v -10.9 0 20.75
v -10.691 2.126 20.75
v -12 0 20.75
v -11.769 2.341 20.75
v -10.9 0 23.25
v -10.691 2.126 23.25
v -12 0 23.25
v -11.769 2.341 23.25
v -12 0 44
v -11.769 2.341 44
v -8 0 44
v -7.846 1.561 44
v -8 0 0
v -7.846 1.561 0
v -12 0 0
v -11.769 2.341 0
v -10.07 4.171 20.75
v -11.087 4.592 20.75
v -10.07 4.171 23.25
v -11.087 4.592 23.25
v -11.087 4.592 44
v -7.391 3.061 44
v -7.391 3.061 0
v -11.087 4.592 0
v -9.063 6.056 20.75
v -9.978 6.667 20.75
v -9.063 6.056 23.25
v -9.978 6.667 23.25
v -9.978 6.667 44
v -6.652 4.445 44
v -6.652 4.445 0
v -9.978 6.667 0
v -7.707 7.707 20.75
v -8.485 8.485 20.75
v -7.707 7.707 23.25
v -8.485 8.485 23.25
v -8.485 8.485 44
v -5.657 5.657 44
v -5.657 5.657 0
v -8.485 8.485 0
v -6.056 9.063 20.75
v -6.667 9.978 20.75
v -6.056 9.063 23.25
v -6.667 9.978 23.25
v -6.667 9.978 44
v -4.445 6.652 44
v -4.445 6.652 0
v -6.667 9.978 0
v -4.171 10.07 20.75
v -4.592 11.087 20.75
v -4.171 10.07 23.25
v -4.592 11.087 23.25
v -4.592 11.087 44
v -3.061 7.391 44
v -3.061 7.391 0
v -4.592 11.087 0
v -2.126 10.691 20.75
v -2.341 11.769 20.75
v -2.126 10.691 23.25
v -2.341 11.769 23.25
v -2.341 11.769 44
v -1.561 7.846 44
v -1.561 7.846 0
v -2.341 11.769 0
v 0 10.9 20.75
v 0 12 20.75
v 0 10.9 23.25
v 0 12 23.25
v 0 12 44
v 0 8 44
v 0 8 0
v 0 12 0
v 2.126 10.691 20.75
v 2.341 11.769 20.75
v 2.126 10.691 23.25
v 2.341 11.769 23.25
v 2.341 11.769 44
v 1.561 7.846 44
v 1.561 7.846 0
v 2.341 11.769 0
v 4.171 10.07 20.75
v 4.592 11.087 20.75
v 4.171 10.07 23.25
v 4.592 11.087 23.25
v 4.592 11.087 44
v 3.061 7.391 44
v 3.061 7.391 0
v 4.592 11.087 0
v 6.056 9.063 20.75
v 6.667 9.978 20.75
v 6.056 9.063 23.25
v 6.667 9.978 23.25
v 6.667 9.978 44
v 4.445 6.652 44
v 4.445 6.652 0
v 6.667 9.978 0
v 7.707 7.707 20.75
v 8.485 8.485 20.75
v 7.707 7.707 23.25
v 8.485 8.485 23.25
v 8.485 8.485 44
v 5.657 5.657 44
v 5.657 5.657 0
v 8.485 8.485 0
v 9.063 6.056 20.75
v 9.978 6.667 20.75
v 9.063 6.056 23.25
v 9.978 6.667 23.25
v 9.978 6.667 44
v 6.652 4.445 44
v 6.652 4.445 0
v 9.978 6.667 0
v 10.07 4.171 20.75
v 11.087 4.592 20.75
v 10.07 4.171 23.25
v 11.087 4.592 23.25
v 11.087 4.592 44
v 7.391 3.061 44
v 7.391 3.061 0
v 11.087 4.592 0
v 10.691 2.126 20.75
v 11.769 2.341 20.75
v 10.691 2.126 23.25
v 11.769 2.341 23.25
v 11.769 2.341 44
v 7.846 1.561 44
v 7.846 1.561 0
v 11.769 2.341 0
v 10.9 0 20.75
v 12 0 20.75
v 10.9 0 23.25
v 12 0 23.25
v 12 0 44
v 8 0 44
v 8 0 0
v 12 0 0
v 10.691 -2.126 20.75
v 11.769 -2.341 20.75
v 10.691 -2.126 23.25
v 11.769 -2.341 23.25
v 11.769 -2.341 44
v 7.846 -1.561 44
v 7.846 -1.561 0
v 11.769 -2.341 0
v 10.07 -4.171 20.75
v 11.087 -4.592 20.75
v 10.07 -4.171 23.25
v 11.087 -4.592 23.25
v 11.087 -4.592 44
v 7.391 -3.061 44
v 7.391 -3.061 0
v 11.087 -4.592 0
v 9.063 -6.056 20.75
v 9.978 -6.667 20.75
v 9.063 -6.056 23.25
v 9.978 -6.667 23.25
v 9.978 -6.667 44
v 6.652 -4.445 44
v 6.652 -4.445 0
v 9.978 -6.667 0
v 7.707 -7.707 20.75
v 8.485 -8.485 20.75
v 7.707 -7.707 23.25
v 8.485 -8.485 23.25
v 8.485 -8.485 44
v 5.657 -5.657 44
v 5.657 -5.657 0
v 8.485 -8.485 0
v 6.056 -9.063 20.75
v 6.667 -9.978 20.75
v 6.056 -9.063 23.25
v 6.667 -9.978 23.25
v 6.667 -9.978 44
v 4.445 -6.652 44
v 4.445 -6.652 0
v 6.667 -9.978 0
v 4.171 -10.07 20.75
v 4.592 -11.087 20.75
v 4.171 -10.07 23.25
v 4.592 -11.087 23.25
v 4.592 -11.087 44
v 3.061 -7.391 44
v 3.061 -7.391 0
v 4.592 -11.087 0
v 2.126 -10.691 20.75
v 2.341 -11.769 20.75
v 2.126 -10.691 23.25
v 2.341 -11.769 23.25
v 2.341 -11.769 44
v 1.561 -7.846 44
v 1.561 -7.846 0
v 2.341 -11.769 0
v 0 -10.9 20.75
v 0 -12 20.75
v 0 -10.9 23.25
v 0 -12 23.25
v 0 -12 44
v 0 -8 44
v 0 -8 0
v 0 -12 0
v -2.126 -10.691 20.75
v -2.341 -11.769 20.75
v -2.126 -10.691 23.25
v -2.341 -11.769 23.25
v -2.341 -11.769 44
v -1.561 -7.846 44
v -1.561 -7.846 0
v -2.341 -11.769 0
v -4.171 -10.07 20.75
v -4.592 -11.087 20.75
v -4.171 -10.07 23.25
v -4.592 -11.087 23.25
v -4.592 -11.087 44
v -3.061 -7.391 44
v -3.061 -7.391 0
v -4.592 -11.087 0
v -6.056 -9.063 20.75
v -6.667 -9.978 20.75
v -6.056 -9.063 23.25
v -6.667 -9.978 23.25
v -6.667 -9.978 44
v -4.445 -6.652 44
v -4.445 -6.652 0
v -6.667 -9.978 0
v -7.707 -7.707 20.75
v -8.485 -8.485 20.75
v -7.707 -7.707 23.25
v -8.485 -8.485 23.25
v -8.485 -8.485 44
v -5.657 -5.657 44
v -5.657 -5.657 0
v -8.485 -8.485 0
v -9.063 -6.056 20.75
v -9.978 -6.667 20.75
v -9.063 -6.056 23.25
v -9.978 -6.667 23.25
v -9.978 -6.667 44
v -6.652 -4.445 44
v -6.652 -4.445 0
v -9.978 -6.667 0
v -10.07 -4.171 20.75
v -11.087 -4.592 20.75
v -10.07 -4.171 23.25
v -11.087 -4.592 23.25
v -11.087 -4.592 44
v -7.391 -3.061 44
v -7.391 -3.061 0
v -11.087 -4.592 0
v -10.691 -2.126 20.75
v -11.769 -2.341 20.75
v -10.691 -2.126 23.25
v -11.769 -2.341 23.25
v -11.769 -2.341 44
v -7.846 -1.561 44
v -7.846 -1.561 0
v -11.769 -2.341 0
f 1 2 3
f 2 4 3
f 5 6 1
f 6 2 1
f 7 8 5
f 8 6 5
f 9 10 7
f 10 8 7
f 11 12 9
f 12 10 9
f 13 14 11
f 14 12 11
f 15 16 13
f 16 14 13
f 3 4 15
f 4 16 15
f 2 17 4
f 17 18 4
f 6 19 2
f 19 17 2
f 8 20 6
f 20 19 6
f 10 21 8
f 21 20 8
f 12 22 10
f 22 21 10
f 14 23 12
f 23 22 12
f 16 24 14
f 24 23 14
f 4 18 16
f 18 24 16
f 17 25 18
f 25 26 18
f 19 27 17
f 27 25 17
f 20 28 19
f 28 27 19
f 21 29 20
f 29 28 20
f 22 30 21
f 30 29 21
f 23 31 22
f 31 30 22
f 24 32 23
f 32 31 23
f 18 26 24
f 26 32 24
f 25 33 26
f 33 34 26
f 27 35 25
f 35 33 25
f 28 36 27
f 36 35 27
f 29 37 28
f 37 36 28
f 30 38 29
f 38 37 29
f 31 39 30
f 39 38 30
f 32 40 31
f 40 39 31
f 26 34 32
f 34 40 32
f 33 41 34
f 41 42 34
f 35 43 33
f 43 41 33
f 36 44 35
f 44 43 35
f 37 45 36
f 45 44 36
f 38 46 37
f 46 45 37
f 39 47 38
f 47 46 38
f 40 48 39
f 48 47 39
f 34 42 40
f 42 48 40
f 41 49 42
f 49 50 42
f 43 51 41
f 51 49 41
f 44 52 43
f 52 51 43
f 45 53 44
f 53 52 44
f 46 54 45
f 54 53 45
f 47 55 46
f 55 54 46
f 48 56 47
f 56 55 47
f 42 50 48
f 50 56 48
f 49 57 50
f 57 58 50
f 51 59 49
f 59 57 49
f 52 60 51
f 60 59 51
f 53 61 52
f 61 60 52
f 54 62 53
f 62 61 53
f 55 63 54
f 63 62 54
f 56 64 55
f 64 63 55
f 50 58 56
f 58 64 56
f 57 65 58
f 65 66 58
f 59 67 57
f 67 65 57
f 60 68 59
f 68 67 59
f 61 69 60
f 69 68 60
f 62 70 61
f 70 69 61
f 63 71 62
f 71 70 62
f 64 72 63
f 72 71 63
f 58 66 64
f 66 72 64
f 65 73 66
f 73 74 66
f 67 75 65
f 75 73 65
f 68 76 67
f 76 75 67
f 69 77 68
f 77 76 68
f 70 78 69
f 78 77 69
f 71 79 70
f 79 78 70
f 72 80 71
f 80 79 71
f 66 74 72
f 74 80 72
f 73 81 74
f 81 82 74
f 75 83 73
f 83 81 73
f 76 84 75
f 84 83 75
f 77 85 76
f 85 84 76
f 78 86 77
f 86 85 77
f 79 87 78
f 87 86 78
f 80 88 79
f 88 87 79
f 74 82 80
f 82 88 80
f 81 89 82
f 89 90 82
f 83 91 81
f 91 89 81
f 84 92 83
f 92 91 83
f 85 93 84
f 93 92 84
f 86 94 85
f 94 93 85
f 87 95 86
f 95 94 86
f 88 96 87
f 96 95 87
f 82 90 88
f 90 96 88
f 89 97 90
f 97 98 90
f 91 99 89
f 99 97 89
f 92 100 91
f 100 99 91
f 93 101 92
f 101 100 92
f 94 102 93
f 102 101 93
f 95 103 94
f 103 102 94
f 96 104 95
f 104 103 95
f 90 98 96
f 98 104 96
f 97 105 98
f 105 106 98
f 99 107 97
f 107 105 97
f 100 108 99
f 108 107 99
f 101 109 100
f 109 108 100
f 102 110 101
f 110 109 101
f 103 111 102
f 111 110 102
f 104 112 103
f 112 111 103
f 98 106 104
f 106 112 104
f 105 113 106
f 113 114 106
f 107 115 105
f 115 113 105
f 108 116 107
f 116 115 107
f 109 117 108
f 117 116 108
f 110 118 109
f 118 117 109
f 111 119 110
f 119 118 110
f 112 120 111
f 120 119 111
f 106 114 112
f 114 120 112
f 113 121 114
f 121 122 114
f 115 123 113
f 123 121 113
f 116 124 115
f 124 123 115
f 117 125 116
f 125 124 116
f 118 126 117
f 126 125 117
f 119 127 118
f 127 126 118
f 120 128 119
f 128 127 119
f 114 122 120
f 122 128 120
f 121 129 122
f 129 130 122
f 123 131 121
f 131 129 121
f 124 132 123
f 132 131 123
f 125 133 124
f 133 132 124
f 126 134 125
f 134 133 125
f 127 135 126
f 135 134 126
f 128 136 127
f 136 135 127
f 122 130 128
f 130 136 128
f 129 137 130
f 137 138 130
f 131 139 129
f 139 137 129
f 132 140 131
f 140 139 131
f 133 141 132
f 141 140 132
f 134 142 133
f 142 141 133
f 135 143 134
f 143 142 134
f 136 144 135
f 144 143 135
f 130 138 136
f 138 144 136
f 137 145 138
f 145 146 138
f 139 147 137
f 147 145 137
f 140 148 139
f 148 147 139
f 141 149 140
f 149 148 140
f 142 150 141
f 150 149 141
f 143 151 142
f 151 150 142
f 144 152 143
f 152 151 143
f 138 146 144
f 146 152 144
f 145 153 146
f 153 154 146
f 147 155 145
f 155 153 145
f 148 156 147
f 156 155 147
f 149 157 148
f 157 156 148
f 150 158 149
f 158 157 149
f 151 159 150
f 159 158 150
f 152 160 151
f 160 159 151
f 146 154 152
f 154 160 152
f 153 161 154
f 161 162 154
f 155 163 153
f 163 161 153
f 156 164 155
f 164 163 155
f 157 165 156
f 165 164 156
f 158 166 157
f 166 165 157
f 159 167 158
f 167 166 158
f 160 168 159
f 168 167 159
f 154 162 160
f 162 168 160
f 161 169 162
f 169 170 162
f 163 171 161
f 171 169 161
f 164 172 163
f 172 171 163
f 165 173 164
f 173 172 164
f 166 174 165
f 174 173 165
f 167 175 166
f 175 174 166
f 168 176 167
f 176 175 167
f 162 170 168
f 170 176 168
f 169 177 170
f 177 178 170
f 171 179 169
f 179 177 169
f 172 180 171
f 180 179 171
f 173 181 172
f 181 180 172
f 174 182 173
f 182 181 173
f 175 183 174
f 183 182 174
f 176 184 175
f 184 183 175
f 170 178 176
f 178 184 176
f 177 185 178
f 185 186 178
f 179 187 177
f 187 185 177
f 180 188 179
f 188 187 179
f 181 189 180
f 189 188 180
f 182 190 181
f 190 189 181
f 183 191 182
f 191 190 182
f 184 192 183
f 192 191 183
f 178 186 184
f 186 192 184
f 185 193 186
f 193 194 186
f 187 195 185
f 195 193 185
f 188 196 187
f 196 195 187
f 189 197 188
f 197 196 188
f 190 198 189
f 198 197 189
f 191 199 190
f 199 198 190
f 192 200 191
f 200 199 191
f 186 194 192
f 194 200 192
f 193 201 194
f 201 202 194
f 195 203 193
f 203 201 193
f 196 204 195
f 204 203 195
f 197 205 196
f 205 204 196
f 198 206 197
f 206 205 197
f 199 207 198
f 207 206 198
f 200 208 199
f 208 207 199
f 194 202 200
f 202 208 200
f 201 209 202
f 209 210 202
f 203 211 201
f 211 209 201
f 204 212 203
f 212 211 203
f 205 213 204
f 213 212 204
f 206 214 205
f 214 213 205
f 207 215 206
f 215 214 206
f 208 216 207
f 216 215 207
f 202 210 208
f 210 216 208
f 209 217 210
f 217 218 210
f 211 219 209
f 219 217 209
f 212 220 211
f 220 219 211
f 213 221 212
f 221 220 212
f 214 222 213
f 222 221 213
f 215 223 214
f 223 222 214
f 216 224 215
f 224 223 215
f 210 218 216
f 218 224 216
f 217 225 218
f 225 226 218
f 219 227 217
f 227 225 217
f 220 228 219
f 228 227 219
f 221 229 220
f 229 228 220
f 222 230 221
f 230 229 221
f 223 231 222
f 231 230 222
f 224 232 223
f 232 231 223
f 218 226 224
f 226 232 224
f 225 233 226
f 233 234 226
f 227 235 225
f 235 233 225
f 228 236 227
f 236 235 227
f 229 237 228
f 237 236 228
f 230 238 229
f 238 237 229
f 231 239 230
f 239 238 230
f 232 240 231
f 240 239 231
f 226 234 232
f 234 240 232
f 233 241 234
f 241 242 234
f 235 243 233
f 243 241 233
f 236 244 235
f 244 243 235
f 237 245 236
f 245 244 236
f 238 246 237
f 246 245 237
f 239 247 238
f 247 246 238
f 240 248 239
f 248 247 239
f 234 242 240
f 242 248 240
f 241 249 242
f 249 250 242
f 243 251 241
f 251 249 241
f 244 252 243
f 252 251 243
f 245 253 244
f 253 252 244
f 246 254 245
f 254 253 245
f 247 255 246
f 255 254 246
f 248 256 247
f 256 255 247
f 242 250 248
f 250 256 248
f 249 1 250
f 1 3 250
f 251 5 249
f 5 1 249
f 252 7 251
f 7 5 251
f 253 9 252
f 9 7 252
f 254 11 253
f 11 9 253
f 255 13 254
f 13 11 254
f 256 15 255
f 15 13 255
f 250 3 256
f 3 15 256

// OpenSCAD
$fn = 32;

// ----------------------------------------------------------------------
// Grooved revolve: stepped, bore R8
// ----------------------------------------------------------------------

// --- parameters (mm) ---
bore_r = 8;               // bore radius
outer_r = 12;             // outer radius of the body
total_h = 44;             // overall height, Z
wall = 4;                 // radial wall thickness
groove_w = 2.5;           // groove width
groove_d = 1.1;           // groove depth
grooves = 1;              // number of outer grooves

bbox_x = 2 * outer_r;  // full diameter
bore_d = 2 * bore_r;  // bore diameter
body_d = 2 * outer_r;  // body diameter
revolve_angle = 360;  // full turn around the Z axis

profile = [[8, 0], [12, 0], [12, 20.75], [10.9, 20.75], [10.9, 23.25], [12, 23.25], [12, 44], [8, 44]];  // primary outline, 8 points, counter clockwise

// --- the one profile operation ---
rotate_extrude(angle = revolve_angle) polygon(points = profile);
